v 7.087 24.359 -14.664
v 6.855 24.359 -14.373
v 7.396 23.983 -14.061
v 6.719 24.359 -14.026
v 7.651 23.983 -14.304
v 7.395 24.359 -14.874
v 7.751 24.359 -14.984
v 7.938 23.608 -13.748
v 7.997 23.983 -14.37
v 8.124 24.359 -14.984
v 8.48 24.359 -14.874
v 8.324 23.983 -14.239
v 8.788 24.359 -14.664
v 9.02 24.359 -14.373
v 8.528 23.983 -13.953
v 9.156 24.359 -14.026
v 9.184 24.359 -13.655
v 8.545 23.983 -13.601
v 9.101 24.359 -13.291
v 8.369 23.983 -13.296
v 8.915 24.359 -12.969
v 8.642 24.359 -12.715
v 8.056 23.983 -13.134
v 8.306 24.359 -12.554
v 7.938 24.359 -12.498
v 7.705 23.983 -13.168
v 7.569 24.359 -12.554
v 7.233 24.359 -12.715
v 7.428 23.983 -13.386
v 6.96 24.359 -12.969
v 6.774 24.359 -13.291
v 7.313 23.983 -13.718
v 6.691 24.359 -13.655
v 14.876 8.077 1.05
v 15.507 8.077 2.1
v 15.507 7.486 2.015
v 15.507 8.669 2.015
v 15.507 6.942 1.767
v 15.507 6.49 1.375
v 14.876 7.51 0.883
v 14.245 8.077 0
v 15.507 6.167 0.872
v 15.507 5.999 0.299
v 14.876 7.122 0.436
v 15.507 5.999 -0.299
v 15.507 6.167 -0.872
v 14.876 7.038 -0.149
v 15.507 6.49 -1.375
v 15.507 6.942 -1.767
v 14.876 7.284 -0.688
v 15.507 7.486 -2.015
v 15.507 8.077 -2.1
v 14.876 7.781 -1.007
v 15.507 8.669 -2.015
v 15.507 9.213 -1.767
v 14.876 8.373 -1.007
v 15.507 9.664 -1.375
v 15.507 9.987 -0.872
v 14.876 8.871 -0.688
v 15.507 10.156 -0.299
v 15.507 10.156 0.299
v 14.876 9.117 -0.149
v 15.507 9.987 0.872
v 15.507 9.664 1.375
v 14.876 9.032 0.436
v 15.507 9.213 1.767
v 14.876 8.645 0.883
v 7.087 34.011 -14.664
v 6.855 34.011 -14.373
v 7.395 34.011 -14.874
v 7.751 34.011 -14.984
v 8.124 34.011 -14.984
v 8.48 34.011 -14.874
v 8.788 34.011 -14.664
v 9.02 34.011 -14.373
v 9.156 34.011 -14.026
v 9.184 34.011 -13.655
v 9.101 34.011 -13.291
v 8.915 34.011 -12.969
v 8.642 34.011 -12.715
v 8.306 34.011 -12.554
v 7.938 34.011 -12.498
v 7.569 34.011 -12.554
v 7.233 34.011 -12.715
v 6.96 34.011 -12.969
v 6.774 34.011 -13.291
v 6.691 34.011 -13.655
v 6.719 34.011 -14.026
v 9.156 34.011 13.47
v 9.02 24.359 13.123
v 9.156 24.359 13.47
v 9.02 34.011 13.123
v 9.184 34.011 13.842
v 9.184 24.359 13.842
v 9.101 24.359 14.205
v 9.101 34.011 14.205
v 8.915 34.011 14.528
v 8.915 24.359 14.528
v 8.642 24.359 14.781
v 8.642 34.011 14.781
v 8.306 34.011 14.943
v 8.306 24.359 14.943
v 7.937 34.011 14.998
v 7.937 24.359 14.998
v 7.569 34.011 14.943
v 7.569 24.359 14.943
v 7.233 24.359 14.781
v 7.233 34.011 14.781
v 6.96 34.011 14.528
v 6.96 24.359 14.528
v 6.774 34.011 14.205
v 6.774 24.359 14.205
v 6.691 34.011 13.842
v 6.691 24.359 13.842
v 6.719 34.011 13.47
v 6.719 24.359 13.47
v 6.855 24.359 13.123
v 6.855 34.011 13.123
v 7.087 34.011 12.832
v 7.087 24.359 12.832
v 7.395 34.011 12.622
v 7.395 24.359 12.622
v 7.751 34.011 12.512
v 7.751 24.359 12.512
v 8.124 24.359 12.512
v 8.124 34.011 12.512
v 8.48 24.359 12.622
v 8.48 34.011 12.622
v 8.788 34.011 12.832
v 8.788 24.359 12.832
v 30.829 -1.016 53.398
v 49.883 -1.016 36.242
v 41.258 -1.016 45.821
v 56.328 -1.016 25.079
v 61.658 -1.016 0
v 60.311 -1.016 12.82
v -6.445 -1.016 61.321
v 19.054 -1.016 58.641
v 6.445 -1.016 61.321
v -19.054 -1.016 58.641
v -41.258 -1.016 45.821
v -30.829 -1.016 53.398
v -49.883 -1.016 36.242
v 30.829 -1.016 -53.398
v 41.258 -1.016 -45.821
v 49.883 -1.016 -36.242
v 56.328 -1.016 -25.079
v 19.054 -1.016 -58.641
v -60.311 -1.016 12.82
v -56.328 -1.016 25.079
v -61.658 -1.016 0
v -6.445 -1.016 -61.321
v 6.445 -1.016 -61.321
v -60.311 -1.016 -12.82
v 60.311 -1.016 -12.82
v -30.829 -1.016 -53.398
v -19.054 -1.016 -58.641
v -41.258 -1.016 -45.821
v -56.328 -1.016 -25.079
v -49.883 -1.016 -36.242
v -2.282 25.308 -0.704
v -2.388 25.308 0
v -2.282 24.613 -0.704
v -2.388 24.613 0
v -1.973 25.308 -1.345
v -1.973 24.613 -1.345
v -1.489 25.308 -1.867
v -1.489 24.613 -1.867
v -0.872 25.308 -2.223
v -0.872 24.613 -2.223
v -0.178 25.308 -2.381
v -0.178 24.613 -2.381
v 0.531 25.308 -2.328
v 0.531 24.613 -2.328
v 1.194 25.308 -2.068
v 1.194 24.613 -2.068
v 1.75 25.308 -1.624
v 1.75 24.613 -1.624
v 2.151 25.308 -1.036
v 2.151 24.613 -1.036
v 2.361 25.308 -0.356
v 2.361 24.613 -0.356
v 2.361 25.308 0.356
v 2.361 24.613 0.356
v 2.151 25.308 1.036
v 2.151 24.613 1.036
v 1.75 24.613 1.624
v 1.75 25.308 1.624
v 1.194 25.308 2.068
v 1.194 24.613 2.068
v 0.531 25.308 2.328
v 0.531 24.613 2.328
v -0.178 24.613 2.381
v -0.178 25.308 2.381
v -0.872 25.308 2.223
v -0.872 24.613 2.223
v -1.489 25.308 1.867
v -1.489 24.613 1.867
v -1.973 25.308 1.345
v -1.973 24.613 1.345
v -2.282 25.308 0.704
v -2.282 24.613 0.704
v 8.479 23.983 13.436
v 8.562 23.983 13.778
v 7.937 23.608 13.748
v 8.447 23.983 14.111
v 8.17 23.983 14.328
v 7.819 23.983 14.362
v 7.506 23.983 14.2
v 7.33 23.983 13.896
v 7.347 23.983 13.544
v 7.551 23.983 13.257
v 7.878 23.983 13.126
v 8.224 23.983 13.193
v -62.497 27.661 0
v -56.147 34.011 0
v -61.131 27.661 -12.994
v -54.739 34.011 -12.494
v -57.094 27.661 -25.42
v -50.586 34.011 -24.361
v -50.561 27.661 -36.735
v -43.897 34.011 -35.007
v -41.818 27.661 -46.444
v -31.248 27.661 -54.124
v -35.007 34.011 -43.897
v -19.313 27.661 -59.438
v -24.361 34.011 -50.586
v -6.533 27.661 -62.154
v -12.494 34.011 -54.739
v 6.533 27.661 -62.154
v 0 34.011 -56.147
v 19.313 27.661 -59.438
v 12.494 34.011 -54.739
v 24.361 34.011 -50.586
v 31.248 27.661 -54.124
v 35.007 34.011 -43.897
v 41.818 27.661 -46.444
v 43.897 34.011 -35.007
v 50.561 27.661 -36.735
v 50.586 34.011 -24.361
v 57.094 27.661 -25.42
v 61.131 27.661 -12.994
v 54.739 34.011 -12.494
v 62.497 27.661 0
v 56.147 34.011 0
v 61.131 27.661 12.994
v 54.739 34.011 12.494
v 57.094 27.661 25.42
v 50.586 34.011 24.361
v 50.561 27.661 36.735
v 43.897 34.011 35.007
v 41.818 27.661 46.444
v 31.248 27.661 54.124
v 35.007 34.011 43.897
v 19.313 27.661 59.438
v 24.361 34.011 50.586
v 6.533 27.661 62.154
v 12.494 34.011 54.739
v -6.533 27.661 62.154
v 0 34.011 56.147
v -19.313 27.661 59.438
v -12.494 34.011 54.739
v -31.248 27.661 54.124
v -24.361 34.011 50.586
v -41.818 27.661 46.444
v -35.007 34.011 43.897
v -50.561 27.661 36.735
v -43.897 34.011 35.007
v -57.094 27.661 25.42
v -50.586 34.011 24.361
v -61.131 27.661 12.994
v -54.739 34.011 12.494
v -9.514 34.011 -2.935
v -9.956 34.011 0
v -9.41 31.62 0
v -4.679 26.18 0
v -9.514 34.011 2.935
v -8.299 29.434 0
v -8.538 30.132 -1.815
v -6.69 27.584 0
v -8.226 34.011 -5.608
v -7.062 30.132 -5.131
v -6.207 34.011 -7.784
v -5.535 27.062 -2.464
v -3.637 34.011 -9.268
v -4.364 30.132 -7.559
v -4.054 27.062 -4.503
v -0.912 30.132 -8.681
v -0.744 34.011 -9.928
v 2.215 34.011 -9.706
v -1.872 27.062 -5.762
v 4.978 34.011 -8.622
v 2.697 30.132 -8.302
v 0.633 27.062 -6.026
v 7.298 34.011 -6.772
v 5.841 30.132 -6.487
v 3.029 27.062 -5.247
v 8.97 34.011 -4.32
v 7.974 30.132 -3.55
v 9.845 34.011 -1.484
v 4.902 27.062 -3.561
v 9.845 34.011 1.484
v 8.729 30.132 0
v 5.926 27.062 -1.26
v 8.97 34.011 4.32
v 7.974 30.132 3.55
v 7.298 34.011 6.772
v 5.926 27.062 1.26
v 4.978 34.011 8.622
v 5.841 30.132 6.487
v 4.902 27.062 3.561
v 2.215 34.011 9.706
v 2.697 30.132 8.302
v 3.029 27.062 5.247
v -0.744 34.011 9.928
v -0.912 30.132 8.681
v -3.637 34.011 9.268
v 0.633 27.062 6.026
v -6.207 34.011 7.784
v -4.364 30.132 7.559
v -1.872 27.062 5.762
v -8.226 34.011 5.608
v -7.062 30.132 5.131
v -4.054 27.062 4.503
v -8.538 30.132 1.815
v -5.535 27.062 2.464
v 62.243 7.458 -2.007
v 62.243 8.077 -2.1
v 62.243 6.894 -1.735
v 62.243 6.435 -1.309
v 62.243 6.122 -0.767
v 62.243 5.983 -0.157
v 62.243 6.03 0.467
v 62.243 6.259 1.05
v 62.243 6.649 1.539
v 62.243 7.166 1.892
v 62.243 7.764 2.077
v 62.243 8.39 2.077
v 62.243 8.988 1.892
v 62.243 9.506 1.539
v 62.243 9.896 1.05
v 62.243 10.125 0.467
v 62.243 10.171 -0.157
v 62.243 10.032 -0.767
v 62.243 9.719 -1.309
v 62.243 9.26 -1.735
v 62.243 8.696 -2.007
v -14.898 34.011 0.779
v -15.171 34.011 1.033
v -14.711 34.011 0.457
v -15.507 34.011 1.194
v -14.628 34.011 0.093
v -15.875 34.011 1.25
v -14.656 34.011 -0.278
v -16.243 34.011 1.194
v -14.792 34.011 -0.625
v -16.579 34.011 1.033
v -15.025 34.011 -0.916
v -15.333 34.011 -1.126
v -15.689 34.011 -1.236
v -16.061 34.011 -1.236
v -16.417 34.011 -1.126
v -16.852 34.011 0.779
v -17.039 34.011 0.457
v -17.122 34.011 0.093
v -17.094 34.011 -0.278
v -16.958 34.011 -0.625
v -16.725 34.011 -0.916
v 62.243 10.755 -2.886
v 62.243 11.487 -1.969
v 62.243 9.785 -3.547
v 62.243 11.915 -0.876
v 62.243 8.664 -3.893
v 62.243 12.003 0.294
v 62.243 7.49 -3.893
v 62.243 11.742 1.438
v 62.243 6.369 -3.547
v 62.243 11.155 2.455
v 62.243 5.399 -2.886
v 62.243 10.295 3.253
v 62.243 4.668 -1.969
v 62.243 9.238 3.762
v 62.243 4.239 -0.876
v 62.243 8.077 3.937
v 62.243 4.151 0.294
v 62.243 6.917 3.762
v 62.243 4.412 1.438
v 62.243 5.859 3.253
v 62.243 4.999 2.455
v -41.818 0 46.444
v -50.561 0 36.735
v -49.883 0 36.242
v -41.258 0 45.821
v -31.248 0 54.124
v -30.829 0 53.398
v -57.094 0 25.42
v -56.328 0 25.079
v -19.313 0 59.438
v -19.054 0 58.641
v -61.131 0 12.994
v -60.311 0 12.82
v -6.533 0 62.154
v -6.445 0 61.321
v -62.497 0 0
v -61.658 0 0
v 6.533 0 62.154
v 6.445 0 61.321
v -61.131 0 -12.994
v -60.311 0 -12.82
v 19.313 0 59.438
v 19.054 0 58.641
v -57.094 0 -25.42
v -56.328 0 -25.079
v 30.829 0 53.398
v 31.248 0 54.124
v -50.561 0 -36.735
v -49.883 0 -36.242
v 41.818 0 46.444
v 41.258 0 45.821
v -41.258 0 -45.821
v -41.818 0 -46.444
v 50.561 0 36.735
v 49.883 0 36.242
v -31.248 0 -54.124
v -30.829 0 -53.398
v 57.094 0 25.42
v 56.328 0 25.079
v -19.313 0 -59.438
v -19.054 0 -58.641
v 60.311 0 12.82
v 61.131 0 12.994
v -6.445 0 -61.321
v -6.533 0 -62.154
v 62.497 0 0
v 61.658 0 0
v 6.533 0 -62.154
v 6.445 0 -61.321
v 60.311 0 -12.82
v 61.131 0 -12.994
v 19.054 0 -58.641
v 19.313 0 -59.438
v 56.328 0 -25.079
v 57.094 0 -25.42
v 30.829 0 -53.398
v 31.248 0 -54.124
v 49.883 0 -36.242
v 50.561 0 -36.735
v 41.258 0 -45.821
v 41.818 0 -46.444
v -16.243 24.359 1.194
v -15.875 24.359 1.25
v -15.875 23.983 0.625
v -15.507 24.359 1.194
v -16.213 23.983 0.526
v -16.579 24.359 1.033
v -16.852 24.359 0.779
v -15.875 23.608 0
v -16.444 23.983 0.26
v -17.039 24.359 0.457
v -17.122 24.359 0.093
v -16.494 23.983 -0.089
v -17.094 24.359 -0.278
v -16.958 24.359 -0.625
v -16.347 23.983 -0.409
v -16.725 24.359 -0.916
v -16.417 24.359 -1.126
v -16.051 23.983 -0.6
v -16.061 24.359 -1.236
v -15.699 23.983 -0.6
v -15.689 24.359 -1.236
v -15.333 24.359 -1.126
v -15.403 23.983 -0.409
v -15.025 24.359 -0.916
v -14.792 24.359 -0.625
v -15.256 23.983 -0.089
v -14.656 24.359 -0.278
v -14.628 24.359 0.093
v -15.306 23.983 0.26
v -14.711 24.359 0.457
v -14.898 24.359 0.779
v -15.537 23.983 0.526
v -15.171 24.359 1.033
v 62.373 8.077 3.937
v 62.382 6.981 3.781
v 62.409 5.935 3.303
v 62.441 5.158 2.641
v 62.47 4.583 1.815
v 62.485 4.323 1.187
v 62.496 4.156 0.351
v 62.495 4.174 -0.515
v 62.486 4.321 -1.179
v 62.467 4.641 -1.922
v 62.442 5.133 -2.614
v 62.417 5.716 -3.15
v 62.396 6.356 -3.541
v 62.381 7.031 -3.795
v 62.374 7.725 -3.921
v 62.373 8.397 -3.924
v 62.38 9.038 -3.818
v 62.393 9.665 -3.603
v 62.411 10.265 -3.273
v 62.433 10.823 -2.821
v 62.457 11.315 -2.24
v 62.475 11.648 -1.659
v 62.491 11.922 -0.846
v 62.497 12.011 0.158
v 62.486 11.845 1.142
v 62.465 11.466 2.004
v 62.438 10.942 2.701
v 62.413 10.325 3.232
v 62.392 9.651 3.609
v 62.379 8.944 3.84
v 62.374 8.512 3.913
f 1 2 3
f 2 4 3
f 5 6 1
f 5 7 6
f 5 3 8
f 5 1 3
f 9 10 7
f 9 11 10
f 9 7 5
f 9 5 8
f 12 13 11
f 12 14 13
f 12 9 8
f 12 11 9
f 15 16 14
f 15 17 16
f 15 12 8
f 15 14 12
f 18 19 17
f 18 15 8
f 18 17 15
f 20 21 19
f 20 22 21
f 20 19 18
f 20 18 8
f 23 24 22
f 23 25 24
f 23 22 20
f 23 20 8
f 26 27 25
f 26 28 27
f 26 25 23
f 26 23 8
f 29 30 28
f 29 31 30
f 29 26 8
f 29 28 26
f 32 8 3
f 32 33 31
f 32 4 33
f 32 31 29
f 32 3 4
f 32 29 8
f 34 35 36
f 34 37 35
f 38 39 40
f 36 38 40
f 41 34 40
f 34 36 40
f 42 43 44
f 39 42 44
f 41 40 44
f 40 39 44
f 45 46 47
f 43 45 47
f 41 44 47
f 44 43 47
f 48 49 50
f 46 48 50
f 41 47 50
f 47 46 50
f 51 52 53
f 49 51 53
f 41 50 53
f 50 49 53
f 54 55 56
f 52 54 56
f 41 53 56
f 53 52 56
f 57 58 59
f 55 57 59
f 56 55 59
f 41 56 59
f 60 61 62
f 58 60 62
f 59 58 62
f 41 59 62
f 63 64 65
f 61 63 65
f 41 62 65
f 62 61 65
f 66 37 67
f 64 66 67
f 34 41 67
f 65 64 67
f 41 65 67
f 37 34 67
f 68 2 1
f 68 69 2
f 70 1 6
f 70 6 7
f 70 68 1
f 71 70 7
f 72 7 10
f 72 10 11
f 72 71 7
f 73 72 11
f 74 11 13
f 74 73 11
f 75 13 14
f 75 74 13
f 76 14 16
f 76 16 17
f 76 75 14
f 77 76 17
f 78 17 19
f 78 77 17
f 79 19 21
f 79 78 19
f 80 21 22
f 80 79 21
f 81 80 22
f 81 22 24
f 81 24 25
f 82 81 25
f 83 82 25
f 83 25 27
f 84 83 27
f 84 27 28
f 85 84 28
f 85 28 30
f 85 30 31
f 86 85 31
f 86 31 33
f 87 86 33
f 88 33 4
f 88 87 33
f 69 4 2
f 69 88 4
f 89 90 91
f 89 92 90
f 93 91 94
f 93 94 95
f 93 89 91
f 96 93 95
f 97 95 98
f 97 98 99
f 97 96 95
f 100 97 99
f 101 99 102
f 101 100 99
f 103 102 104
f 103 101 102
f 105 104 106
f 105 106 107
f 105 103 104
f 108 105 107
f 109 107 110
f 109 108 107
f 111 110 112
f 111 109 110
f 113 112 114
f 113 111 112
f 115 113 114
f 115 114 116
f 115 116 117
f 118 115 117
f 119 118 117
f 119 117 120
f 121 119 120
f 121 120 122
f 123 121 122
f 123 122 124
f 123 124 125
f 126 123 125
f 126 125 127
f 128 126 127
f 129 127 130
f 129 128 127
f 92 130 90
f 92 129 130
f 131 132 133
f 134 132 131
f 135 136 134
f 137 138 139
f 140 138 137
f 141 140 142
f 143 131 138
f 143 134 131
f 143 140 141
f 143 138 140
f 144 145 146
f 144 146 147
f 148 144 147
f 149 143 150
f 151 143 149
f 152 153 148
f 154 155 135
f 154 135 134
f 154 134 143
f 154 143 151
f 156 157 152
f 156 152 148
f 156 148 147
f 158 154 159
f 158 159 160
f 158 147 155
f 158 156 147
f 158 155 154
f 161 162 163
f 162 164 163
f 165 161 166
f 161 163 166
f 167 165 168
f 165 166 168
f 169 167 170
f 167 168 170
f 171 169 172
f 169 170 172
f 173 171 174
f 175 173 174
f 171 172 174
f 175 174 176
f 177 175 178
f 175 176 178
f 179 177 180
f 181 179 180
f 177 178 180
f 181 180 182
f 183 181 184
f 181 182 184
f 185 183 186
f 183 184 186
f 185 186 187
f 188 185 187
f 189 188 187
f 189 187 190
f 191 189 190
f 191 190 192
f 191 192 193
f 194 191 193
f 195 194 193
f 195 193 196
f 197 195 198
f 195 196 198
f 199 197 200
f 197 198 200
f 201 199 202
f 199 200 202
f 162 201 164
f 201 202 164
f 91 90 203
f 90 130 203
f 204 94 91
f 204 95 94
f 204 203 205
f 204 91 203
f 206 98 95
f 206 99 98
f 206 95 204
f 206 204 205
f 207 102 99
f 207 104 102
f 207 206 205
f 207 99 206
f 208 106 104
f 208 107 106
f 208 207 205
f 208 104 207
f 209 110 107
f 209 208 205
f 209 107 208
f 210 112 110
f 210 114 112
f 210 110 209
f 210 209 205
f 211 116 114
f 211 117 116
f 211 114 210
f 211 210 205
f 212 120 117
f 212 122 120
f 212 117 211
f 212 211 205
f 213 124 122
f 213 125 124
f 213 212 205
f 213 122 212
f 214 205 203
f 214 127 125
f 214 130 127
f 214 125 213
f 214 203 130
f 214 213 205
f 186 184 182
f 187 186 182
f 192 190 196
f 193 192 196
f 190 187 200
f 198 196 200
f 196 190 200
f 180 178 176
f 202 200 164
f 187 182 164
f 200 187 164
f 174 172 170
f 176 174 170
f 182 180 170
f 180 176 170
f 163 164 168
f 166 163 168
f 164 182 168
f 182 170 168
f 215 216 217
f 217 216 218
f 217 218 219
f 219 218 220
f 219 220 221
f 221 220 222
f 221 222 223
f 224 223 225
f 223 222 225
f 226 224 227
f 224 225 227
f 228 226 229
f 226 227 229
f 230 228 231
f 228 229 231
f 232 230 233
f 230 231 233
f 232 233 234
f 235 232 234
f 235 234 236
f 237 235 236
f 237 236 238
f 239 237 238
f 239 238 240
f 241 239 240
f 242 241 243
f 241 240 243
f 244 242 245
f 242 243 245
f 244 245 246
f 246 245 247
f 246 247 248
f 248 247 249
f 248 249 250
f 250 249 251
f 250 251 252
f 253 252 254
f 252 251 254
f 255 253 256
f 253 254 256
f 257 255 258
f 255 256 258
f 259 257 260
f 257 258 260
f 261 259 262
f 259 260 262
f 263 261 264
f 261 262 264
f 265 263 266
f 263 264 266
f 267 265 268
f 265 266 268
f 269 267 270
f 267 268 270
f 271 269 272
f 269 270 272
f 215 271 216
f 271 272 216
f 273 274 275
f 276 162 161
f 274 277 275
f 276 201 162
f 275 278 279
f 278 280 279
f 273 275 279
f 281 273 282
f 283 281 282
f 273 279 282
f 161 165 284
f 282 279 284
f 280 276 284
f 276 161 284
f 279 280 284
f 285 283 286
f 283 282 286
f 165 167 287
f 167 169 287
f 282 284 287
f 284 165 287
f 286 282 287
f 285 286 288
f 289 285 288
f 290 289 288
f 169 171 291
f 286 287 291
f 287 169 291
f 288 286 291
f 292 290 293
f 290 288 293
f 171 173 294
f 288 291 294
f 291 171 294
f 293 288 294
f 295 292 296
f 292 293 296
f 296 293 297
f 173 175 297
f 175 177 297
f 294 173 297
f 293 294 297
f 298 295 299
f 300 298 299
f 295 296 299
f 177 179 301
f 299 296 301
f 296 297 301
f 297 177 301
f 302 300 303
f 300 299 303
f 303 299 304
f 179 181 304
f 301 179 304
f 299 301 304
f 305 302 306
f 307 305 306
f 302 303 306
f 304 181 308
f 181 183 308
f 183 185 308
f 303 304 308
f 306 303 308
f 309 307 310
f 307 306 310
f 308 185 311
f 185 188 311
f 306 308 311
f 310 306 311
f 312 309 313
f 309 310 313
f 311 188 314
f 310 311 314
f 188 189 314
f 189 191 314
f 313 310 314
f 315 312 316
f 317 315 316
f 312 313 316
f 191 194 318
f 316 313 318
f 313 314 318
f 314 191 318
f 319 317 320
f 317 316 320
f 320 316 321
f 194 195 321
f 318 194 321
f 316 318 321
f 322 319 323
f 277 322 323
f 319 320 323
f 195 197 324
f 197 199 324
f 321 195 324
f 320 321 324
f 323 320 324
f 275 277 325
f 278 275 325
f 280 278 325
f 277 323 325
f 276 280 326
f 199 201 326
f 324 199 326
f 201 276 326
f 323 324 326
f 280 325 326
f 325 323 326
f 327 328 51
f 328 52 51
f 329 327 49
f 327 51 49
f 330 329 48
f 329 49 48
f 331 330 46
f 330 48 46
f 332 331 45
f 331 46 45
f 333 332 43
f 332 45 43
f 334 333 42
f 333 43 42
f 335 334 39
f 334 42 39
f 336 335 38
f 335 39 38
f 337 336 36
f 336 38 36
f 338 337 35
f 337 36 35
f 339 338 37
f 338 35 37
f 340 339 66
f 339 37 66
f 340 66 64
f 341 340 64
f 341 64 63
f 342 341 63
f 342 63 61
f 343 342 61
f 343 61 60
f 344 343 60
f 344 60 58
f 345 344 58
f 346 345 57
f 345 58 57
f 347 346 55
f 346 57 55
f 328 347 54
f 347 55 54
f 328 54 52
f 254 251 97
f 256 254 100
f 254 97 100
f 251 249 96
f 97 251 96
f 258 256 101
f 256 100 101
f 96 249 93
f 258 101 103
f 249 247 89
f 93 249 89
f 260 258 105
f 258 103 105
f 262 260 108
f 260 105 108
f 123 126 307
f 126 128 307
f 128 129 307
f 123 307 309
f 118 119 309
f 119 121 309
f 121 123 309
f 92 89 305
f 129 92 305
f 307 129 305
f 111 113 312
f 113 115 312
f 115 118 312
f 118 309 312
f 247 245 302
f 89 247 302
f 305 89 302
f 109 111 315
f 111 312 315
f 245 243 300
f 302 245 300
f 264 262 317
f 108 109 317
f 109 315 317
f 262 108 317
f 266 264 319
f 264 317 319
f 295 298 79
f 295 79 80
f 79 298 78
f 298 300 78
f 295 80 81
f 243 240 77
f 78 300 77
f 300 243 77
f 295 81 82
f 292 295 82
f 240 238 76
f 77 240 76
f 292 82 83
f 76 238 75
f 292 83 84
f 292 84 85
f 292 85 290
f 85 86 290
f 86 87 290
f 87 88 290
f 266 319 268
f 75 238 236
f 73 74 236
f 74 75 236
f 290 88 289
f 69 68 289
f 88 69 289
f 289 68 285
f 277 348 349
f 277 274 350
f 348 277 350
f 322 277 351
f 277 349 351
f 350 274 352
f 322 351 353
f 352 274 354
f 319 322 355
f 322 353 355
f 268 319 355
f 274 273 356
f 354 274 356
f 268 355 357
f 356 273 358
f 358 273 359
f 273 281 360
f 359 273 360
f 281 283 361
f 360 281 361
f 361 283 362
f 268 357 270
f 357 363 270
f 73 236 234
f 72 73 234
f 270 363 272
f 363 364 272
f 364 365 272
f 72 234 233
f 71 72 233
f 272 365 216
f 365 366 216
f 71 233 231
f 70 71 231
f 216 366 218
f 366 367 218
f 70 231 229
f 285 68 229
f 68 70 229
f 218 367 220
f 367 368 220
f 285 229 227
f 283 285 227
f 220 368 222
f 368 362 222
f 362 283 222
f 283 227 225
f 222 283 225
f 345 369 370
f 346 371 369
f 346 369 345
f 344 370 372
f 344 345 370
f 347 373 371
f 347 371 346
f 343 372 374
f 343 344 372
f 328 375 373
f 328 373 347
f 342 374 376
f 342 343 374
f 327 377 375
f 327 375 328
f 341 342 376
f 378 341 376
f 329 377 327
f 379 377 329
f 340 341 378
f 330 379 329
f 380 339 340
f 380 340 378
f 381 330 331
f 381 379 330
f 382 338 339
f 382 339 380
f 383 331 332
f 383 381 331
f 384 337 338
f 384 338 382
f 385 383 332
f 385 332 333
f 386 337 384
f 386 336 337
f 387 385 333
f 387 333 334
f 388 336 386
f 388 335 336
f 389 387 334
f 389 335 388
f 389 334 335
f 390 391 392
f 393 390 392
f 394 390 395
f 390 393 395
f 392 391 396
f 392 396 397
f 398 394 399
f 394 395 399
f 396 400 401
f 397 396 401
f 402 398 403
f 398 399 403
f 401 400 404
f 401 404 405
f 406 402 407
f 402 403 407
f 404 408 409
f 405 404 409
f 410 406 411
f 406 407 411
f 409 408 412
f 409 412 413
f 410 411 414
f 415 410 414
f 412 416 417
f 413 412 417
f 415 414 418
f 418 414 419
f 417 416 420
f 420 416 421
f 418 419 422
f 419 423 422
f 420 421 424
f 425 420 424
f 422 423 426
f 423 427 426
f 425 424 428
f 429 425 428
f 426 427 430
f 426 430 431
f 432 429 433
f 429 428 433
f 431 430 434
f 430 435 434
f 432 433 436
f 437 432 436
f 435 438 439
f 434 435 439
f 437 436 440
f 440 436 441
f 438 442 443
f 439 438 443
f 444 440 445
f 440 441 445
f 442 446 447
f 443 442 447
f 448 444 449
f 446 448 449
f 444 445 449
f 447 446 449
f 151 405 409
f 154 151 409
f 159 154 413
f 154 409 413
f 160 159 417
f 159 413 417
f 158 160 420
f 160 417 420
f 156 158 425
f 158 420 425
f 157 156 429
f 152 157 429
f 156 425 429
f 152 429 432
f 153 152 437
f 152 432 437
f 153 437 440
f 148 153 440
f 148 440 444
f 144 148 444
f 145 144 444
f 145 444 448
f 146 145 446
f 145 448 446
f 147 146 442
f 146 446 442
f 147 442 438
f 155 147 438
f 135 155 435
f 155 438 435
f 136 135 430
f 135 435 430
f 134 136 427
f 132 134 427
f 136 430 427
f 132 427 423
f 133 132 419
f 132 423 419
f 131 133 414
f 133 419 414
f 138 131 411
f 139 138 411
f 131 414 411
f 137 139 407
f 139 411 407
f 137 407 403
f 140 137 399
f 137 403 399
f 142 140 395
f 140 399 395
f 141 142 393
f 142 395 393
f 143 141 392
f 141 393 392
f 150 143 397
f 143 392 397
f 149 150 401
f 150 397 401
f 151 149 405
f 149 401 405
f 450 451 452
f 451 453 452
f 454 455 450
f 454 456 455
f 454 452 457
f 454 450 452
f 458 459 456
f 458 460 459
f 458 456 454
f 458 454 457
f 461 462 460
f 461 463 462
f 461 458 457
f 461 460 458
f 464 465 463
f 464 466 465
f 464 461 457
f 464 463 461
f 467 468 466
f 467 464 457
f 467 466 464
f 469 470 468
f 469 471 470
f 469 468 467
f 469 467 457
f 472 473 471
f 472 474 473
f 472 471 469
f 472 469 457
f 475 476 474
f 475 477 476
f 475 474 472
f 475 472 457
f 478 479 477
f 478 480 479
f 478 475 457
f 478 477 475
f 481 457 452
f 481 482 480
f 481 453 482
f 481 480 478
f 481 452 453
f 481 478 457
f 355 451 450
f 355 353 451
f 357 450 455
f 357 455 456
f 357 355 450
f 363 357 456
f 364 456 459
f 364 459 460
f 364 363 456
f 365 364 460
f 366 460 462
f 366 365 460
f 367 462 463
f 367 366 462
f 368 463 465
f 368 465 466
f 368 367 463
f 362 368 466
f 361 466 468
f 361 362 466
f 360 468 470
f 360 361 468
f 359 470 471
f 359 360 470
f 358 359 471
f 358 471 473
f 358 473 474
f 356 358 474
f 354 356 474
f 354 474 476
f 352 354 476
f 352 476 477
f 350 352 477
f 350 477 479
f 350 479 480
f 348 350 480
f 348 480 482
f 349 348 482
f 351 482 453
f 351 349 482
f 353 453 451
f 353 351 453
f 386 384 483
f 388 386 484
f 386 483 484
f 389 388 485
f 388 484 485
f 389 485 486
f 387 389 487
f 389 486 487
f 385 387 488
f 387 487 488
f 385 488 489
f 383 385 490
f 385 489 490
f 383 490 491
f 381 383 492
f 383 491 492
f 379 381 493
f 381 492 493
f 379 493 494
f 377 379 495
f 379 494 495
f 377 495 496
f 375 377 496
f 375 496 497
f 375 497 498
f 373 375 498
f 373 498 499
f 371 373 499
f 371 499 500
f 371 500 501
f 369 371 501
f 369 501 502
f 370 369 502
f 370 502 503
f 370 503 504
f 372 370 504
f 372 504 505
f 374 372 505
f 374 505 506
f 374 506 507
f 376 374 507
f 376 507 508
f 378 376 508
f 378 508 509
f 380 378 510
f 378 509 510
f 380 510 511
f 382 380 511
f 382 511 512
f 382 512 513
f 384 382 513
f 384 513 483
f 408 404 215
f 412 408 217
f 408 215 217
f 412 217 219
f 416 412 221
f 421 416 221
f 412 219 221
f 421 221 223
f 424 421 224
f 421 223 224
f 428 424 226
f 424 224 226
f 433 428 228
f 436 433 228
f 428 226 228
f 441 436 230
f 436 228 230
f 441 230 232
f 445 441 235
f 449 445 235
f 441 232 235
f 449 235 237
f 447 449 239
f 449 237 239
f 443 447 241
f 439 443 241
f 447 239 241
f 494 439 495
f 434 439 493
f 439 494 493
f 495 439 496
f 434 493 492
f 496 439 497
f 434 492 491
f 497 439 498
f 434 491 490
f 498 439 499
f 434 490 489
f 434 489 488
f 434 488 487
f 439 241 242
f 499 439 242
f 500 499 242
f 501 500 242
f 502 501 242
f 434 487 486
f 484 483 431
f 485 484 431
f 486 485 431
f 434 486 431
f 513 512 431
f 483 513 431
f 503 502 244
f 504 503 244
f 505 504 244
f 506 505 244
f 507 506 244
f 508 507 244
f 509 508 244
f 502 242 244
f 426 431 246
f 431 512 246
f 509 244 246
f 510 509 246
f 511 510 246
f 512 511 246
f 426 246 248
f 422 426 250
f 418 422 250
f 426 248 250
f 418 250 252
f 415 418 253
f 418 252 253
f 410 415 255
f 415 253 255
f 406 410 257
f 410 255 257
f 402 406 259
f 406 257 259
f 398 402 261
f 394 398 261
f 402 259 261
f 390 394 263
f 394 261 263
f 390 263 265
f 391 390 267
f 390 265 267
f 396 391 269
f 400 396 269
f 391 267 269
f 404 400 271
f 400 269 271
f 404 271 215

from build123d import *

# Parameters (mm, degrees)
M5X0_8_TAPPED_HOLE1_D                               = 4.2
M5X0_8_TAPPED_HOLE1_DEPTH                           = 46.99
M5X0_8_TAPPED_HOLE1_TIP                             = 1.2618073
CIRPATTERN1_COUNT                                   = 3
CBORE_FOR_00_BINDING_HEAD_MACHINE_SCREW_D           = 1.397
CBORE_FOR_00_BINDING_HEAD_MACHINE_SCREW_DEPTH       = 6.35
CBORE_FOR_00_BINDING_HEAD_MACHINE_SCREW_CBORE_D     = 7.874
CBORE_FOR_00_BINDING_HEAD_MACHINE_SCREW_CBORE_DEPTH = 0.254
CBORE_FOR_00_BINDING_HEAD_MACHINE_SCREW_TIP         = 0.419701142
SKETCH2_R                                           = 61.6585
EXTRUDE1_DEPTH                                      = 1.016


with BuildPart() as part:
    # Sketch1 → Revolve1 (revolve)
    with BuildSketch(Plane.XY, mode=Mode.PRIVATE) as revolve1_sk:
        with BuildLine():
            Line((0, 0), (62.4967, 0))
            Line((62.4967, 0), (62.4967, 27.6606))
            Line((62.4967, 27.6606), (56.1467, 34.0106))
            Line((56.1467, 34.0106), (9.955892816, 34.0106))
            ThreePointArc((9.955892816, 34.0106), (7.551444809, 28.459428687), (2.3876, 25.307987753))
            Line((2.3876, 25.307987753), (2.3876, 24.6126))
            Line((2.3876, 24.6126), (0, 24.6126))
            Line((0, 24.6126), (0, 0))
        make_face()
    revolve(revolve1_sk.sketch.rotate(Axis((0, 23.9776, 0), (0, -1, 0)), 180), axis=Axis((0, 23.9776, 0), (0, -1, 0)))  # turned: the seam where the file's is

    # M5x0.8 Tapped Hole1
    with Locations(Plane(origin=(62.4967, 8.0772, 0), x_dir=(0, 0, 1), z_dir=(1, 0, 0))):
        with Locations((0, 0)):
            Hole(M5X0_8_TAPPED_HOLE1_D / 2, depth=M5X0_8_TAPPED_HOLE1_DEPTH)
            with Locations((0, 0, -(M5X0_8_TAPPED_HOLE1_DEPTH + M5X0_8_TAPPED_HOLE1_TIP / 2))):  # 118° drill point
                Cone(0, M5X0_8_TAPPED_HOLE1_D / 2, M5X0_8_TAPPED_HOLE1_TIP, mode=Mode.SUBTRACT)

    # Sketch5 → M3x0.5 Tapped Hole1 (revolve, cut)
    with BuildSketch(Plane(origin=(-15.875, 34.0106, 0), x_dir=(0, 0, 1), z_dir=(1, 0, 0))):
        Polygon((0, 0), (0, 10.403075774), (1.25, 9.652), (1.25, 0), align=None)
    m3x0_5_tapped_hole1 = revolve(axis=Axis((-15.875, 40.3606, 0), (0, -1, 0)), mode=Mode.SUBTRACT)

    # CirPattern1: M3x0.5 Tapped Hole1 ×3 about axis
    cirpattern1_axis = Axis((0, 0, 0), (0, 1, 0))
    for i in range(1, CIRPATTERN1_COUNT):
        add(m3x0_5_tapped_hole1.rotate(cirpattern1_axis, i * 360 / CIRPATTERN1_COUNT), mode=Mode.SUBTRACT)

    # CBORE for #00 Binding Head Machine Screw1
    with Locations(Plane(origin=(62.4967, 8.0772, 0), x_dir=(0, 0, 1), z_dir=(1, 0, 0))):
        with Locations((0, 0)):
            CounterBoreHole(CBORE_FOR_00_BINDING_HEAD_MACHINE_SCREW_D / 2, CBORE_FOR_00_BINDING_HEAD_MACHINE_SCREW_CBORE_D / 2, CBORE_FOR_00_BINDING_HEAD_MACHINE_SCREW_CBORE_DEPTH, depth=CBORE_FOR_00_BINDING_HEAD_MACHINE_SCREW_DEPTH)
            with Locations((0, 0, -(CBORE_FOR_00_BINDING_HEAD_MACHINE_SCREW_DEPTH + CBORE_FOR_00_BINDING_HEAD_MACHINE_SCREW_TIP / 2))):  # 118° drill point
                Cone(0, CBORE_FOR_00_BINDING_HEAD_MACHINE_SCREW_D / 2, CBORE_FOR_00_BINDING_HEAD_MACHINE_SCREW_TIP, mode=Mode.SUBTRACT)

    # Sketch2 → Extrude1 (add)
    with BuildSketch(Plane.XZ):
        with Locations(Location((0, 0, 0), (0, 0, 180))):  # turned: the seam where the file's is
            Circle(SKETCH2_R)
    extrude(amount=EXTRUDE1_DEPTH)


solid = part.part
